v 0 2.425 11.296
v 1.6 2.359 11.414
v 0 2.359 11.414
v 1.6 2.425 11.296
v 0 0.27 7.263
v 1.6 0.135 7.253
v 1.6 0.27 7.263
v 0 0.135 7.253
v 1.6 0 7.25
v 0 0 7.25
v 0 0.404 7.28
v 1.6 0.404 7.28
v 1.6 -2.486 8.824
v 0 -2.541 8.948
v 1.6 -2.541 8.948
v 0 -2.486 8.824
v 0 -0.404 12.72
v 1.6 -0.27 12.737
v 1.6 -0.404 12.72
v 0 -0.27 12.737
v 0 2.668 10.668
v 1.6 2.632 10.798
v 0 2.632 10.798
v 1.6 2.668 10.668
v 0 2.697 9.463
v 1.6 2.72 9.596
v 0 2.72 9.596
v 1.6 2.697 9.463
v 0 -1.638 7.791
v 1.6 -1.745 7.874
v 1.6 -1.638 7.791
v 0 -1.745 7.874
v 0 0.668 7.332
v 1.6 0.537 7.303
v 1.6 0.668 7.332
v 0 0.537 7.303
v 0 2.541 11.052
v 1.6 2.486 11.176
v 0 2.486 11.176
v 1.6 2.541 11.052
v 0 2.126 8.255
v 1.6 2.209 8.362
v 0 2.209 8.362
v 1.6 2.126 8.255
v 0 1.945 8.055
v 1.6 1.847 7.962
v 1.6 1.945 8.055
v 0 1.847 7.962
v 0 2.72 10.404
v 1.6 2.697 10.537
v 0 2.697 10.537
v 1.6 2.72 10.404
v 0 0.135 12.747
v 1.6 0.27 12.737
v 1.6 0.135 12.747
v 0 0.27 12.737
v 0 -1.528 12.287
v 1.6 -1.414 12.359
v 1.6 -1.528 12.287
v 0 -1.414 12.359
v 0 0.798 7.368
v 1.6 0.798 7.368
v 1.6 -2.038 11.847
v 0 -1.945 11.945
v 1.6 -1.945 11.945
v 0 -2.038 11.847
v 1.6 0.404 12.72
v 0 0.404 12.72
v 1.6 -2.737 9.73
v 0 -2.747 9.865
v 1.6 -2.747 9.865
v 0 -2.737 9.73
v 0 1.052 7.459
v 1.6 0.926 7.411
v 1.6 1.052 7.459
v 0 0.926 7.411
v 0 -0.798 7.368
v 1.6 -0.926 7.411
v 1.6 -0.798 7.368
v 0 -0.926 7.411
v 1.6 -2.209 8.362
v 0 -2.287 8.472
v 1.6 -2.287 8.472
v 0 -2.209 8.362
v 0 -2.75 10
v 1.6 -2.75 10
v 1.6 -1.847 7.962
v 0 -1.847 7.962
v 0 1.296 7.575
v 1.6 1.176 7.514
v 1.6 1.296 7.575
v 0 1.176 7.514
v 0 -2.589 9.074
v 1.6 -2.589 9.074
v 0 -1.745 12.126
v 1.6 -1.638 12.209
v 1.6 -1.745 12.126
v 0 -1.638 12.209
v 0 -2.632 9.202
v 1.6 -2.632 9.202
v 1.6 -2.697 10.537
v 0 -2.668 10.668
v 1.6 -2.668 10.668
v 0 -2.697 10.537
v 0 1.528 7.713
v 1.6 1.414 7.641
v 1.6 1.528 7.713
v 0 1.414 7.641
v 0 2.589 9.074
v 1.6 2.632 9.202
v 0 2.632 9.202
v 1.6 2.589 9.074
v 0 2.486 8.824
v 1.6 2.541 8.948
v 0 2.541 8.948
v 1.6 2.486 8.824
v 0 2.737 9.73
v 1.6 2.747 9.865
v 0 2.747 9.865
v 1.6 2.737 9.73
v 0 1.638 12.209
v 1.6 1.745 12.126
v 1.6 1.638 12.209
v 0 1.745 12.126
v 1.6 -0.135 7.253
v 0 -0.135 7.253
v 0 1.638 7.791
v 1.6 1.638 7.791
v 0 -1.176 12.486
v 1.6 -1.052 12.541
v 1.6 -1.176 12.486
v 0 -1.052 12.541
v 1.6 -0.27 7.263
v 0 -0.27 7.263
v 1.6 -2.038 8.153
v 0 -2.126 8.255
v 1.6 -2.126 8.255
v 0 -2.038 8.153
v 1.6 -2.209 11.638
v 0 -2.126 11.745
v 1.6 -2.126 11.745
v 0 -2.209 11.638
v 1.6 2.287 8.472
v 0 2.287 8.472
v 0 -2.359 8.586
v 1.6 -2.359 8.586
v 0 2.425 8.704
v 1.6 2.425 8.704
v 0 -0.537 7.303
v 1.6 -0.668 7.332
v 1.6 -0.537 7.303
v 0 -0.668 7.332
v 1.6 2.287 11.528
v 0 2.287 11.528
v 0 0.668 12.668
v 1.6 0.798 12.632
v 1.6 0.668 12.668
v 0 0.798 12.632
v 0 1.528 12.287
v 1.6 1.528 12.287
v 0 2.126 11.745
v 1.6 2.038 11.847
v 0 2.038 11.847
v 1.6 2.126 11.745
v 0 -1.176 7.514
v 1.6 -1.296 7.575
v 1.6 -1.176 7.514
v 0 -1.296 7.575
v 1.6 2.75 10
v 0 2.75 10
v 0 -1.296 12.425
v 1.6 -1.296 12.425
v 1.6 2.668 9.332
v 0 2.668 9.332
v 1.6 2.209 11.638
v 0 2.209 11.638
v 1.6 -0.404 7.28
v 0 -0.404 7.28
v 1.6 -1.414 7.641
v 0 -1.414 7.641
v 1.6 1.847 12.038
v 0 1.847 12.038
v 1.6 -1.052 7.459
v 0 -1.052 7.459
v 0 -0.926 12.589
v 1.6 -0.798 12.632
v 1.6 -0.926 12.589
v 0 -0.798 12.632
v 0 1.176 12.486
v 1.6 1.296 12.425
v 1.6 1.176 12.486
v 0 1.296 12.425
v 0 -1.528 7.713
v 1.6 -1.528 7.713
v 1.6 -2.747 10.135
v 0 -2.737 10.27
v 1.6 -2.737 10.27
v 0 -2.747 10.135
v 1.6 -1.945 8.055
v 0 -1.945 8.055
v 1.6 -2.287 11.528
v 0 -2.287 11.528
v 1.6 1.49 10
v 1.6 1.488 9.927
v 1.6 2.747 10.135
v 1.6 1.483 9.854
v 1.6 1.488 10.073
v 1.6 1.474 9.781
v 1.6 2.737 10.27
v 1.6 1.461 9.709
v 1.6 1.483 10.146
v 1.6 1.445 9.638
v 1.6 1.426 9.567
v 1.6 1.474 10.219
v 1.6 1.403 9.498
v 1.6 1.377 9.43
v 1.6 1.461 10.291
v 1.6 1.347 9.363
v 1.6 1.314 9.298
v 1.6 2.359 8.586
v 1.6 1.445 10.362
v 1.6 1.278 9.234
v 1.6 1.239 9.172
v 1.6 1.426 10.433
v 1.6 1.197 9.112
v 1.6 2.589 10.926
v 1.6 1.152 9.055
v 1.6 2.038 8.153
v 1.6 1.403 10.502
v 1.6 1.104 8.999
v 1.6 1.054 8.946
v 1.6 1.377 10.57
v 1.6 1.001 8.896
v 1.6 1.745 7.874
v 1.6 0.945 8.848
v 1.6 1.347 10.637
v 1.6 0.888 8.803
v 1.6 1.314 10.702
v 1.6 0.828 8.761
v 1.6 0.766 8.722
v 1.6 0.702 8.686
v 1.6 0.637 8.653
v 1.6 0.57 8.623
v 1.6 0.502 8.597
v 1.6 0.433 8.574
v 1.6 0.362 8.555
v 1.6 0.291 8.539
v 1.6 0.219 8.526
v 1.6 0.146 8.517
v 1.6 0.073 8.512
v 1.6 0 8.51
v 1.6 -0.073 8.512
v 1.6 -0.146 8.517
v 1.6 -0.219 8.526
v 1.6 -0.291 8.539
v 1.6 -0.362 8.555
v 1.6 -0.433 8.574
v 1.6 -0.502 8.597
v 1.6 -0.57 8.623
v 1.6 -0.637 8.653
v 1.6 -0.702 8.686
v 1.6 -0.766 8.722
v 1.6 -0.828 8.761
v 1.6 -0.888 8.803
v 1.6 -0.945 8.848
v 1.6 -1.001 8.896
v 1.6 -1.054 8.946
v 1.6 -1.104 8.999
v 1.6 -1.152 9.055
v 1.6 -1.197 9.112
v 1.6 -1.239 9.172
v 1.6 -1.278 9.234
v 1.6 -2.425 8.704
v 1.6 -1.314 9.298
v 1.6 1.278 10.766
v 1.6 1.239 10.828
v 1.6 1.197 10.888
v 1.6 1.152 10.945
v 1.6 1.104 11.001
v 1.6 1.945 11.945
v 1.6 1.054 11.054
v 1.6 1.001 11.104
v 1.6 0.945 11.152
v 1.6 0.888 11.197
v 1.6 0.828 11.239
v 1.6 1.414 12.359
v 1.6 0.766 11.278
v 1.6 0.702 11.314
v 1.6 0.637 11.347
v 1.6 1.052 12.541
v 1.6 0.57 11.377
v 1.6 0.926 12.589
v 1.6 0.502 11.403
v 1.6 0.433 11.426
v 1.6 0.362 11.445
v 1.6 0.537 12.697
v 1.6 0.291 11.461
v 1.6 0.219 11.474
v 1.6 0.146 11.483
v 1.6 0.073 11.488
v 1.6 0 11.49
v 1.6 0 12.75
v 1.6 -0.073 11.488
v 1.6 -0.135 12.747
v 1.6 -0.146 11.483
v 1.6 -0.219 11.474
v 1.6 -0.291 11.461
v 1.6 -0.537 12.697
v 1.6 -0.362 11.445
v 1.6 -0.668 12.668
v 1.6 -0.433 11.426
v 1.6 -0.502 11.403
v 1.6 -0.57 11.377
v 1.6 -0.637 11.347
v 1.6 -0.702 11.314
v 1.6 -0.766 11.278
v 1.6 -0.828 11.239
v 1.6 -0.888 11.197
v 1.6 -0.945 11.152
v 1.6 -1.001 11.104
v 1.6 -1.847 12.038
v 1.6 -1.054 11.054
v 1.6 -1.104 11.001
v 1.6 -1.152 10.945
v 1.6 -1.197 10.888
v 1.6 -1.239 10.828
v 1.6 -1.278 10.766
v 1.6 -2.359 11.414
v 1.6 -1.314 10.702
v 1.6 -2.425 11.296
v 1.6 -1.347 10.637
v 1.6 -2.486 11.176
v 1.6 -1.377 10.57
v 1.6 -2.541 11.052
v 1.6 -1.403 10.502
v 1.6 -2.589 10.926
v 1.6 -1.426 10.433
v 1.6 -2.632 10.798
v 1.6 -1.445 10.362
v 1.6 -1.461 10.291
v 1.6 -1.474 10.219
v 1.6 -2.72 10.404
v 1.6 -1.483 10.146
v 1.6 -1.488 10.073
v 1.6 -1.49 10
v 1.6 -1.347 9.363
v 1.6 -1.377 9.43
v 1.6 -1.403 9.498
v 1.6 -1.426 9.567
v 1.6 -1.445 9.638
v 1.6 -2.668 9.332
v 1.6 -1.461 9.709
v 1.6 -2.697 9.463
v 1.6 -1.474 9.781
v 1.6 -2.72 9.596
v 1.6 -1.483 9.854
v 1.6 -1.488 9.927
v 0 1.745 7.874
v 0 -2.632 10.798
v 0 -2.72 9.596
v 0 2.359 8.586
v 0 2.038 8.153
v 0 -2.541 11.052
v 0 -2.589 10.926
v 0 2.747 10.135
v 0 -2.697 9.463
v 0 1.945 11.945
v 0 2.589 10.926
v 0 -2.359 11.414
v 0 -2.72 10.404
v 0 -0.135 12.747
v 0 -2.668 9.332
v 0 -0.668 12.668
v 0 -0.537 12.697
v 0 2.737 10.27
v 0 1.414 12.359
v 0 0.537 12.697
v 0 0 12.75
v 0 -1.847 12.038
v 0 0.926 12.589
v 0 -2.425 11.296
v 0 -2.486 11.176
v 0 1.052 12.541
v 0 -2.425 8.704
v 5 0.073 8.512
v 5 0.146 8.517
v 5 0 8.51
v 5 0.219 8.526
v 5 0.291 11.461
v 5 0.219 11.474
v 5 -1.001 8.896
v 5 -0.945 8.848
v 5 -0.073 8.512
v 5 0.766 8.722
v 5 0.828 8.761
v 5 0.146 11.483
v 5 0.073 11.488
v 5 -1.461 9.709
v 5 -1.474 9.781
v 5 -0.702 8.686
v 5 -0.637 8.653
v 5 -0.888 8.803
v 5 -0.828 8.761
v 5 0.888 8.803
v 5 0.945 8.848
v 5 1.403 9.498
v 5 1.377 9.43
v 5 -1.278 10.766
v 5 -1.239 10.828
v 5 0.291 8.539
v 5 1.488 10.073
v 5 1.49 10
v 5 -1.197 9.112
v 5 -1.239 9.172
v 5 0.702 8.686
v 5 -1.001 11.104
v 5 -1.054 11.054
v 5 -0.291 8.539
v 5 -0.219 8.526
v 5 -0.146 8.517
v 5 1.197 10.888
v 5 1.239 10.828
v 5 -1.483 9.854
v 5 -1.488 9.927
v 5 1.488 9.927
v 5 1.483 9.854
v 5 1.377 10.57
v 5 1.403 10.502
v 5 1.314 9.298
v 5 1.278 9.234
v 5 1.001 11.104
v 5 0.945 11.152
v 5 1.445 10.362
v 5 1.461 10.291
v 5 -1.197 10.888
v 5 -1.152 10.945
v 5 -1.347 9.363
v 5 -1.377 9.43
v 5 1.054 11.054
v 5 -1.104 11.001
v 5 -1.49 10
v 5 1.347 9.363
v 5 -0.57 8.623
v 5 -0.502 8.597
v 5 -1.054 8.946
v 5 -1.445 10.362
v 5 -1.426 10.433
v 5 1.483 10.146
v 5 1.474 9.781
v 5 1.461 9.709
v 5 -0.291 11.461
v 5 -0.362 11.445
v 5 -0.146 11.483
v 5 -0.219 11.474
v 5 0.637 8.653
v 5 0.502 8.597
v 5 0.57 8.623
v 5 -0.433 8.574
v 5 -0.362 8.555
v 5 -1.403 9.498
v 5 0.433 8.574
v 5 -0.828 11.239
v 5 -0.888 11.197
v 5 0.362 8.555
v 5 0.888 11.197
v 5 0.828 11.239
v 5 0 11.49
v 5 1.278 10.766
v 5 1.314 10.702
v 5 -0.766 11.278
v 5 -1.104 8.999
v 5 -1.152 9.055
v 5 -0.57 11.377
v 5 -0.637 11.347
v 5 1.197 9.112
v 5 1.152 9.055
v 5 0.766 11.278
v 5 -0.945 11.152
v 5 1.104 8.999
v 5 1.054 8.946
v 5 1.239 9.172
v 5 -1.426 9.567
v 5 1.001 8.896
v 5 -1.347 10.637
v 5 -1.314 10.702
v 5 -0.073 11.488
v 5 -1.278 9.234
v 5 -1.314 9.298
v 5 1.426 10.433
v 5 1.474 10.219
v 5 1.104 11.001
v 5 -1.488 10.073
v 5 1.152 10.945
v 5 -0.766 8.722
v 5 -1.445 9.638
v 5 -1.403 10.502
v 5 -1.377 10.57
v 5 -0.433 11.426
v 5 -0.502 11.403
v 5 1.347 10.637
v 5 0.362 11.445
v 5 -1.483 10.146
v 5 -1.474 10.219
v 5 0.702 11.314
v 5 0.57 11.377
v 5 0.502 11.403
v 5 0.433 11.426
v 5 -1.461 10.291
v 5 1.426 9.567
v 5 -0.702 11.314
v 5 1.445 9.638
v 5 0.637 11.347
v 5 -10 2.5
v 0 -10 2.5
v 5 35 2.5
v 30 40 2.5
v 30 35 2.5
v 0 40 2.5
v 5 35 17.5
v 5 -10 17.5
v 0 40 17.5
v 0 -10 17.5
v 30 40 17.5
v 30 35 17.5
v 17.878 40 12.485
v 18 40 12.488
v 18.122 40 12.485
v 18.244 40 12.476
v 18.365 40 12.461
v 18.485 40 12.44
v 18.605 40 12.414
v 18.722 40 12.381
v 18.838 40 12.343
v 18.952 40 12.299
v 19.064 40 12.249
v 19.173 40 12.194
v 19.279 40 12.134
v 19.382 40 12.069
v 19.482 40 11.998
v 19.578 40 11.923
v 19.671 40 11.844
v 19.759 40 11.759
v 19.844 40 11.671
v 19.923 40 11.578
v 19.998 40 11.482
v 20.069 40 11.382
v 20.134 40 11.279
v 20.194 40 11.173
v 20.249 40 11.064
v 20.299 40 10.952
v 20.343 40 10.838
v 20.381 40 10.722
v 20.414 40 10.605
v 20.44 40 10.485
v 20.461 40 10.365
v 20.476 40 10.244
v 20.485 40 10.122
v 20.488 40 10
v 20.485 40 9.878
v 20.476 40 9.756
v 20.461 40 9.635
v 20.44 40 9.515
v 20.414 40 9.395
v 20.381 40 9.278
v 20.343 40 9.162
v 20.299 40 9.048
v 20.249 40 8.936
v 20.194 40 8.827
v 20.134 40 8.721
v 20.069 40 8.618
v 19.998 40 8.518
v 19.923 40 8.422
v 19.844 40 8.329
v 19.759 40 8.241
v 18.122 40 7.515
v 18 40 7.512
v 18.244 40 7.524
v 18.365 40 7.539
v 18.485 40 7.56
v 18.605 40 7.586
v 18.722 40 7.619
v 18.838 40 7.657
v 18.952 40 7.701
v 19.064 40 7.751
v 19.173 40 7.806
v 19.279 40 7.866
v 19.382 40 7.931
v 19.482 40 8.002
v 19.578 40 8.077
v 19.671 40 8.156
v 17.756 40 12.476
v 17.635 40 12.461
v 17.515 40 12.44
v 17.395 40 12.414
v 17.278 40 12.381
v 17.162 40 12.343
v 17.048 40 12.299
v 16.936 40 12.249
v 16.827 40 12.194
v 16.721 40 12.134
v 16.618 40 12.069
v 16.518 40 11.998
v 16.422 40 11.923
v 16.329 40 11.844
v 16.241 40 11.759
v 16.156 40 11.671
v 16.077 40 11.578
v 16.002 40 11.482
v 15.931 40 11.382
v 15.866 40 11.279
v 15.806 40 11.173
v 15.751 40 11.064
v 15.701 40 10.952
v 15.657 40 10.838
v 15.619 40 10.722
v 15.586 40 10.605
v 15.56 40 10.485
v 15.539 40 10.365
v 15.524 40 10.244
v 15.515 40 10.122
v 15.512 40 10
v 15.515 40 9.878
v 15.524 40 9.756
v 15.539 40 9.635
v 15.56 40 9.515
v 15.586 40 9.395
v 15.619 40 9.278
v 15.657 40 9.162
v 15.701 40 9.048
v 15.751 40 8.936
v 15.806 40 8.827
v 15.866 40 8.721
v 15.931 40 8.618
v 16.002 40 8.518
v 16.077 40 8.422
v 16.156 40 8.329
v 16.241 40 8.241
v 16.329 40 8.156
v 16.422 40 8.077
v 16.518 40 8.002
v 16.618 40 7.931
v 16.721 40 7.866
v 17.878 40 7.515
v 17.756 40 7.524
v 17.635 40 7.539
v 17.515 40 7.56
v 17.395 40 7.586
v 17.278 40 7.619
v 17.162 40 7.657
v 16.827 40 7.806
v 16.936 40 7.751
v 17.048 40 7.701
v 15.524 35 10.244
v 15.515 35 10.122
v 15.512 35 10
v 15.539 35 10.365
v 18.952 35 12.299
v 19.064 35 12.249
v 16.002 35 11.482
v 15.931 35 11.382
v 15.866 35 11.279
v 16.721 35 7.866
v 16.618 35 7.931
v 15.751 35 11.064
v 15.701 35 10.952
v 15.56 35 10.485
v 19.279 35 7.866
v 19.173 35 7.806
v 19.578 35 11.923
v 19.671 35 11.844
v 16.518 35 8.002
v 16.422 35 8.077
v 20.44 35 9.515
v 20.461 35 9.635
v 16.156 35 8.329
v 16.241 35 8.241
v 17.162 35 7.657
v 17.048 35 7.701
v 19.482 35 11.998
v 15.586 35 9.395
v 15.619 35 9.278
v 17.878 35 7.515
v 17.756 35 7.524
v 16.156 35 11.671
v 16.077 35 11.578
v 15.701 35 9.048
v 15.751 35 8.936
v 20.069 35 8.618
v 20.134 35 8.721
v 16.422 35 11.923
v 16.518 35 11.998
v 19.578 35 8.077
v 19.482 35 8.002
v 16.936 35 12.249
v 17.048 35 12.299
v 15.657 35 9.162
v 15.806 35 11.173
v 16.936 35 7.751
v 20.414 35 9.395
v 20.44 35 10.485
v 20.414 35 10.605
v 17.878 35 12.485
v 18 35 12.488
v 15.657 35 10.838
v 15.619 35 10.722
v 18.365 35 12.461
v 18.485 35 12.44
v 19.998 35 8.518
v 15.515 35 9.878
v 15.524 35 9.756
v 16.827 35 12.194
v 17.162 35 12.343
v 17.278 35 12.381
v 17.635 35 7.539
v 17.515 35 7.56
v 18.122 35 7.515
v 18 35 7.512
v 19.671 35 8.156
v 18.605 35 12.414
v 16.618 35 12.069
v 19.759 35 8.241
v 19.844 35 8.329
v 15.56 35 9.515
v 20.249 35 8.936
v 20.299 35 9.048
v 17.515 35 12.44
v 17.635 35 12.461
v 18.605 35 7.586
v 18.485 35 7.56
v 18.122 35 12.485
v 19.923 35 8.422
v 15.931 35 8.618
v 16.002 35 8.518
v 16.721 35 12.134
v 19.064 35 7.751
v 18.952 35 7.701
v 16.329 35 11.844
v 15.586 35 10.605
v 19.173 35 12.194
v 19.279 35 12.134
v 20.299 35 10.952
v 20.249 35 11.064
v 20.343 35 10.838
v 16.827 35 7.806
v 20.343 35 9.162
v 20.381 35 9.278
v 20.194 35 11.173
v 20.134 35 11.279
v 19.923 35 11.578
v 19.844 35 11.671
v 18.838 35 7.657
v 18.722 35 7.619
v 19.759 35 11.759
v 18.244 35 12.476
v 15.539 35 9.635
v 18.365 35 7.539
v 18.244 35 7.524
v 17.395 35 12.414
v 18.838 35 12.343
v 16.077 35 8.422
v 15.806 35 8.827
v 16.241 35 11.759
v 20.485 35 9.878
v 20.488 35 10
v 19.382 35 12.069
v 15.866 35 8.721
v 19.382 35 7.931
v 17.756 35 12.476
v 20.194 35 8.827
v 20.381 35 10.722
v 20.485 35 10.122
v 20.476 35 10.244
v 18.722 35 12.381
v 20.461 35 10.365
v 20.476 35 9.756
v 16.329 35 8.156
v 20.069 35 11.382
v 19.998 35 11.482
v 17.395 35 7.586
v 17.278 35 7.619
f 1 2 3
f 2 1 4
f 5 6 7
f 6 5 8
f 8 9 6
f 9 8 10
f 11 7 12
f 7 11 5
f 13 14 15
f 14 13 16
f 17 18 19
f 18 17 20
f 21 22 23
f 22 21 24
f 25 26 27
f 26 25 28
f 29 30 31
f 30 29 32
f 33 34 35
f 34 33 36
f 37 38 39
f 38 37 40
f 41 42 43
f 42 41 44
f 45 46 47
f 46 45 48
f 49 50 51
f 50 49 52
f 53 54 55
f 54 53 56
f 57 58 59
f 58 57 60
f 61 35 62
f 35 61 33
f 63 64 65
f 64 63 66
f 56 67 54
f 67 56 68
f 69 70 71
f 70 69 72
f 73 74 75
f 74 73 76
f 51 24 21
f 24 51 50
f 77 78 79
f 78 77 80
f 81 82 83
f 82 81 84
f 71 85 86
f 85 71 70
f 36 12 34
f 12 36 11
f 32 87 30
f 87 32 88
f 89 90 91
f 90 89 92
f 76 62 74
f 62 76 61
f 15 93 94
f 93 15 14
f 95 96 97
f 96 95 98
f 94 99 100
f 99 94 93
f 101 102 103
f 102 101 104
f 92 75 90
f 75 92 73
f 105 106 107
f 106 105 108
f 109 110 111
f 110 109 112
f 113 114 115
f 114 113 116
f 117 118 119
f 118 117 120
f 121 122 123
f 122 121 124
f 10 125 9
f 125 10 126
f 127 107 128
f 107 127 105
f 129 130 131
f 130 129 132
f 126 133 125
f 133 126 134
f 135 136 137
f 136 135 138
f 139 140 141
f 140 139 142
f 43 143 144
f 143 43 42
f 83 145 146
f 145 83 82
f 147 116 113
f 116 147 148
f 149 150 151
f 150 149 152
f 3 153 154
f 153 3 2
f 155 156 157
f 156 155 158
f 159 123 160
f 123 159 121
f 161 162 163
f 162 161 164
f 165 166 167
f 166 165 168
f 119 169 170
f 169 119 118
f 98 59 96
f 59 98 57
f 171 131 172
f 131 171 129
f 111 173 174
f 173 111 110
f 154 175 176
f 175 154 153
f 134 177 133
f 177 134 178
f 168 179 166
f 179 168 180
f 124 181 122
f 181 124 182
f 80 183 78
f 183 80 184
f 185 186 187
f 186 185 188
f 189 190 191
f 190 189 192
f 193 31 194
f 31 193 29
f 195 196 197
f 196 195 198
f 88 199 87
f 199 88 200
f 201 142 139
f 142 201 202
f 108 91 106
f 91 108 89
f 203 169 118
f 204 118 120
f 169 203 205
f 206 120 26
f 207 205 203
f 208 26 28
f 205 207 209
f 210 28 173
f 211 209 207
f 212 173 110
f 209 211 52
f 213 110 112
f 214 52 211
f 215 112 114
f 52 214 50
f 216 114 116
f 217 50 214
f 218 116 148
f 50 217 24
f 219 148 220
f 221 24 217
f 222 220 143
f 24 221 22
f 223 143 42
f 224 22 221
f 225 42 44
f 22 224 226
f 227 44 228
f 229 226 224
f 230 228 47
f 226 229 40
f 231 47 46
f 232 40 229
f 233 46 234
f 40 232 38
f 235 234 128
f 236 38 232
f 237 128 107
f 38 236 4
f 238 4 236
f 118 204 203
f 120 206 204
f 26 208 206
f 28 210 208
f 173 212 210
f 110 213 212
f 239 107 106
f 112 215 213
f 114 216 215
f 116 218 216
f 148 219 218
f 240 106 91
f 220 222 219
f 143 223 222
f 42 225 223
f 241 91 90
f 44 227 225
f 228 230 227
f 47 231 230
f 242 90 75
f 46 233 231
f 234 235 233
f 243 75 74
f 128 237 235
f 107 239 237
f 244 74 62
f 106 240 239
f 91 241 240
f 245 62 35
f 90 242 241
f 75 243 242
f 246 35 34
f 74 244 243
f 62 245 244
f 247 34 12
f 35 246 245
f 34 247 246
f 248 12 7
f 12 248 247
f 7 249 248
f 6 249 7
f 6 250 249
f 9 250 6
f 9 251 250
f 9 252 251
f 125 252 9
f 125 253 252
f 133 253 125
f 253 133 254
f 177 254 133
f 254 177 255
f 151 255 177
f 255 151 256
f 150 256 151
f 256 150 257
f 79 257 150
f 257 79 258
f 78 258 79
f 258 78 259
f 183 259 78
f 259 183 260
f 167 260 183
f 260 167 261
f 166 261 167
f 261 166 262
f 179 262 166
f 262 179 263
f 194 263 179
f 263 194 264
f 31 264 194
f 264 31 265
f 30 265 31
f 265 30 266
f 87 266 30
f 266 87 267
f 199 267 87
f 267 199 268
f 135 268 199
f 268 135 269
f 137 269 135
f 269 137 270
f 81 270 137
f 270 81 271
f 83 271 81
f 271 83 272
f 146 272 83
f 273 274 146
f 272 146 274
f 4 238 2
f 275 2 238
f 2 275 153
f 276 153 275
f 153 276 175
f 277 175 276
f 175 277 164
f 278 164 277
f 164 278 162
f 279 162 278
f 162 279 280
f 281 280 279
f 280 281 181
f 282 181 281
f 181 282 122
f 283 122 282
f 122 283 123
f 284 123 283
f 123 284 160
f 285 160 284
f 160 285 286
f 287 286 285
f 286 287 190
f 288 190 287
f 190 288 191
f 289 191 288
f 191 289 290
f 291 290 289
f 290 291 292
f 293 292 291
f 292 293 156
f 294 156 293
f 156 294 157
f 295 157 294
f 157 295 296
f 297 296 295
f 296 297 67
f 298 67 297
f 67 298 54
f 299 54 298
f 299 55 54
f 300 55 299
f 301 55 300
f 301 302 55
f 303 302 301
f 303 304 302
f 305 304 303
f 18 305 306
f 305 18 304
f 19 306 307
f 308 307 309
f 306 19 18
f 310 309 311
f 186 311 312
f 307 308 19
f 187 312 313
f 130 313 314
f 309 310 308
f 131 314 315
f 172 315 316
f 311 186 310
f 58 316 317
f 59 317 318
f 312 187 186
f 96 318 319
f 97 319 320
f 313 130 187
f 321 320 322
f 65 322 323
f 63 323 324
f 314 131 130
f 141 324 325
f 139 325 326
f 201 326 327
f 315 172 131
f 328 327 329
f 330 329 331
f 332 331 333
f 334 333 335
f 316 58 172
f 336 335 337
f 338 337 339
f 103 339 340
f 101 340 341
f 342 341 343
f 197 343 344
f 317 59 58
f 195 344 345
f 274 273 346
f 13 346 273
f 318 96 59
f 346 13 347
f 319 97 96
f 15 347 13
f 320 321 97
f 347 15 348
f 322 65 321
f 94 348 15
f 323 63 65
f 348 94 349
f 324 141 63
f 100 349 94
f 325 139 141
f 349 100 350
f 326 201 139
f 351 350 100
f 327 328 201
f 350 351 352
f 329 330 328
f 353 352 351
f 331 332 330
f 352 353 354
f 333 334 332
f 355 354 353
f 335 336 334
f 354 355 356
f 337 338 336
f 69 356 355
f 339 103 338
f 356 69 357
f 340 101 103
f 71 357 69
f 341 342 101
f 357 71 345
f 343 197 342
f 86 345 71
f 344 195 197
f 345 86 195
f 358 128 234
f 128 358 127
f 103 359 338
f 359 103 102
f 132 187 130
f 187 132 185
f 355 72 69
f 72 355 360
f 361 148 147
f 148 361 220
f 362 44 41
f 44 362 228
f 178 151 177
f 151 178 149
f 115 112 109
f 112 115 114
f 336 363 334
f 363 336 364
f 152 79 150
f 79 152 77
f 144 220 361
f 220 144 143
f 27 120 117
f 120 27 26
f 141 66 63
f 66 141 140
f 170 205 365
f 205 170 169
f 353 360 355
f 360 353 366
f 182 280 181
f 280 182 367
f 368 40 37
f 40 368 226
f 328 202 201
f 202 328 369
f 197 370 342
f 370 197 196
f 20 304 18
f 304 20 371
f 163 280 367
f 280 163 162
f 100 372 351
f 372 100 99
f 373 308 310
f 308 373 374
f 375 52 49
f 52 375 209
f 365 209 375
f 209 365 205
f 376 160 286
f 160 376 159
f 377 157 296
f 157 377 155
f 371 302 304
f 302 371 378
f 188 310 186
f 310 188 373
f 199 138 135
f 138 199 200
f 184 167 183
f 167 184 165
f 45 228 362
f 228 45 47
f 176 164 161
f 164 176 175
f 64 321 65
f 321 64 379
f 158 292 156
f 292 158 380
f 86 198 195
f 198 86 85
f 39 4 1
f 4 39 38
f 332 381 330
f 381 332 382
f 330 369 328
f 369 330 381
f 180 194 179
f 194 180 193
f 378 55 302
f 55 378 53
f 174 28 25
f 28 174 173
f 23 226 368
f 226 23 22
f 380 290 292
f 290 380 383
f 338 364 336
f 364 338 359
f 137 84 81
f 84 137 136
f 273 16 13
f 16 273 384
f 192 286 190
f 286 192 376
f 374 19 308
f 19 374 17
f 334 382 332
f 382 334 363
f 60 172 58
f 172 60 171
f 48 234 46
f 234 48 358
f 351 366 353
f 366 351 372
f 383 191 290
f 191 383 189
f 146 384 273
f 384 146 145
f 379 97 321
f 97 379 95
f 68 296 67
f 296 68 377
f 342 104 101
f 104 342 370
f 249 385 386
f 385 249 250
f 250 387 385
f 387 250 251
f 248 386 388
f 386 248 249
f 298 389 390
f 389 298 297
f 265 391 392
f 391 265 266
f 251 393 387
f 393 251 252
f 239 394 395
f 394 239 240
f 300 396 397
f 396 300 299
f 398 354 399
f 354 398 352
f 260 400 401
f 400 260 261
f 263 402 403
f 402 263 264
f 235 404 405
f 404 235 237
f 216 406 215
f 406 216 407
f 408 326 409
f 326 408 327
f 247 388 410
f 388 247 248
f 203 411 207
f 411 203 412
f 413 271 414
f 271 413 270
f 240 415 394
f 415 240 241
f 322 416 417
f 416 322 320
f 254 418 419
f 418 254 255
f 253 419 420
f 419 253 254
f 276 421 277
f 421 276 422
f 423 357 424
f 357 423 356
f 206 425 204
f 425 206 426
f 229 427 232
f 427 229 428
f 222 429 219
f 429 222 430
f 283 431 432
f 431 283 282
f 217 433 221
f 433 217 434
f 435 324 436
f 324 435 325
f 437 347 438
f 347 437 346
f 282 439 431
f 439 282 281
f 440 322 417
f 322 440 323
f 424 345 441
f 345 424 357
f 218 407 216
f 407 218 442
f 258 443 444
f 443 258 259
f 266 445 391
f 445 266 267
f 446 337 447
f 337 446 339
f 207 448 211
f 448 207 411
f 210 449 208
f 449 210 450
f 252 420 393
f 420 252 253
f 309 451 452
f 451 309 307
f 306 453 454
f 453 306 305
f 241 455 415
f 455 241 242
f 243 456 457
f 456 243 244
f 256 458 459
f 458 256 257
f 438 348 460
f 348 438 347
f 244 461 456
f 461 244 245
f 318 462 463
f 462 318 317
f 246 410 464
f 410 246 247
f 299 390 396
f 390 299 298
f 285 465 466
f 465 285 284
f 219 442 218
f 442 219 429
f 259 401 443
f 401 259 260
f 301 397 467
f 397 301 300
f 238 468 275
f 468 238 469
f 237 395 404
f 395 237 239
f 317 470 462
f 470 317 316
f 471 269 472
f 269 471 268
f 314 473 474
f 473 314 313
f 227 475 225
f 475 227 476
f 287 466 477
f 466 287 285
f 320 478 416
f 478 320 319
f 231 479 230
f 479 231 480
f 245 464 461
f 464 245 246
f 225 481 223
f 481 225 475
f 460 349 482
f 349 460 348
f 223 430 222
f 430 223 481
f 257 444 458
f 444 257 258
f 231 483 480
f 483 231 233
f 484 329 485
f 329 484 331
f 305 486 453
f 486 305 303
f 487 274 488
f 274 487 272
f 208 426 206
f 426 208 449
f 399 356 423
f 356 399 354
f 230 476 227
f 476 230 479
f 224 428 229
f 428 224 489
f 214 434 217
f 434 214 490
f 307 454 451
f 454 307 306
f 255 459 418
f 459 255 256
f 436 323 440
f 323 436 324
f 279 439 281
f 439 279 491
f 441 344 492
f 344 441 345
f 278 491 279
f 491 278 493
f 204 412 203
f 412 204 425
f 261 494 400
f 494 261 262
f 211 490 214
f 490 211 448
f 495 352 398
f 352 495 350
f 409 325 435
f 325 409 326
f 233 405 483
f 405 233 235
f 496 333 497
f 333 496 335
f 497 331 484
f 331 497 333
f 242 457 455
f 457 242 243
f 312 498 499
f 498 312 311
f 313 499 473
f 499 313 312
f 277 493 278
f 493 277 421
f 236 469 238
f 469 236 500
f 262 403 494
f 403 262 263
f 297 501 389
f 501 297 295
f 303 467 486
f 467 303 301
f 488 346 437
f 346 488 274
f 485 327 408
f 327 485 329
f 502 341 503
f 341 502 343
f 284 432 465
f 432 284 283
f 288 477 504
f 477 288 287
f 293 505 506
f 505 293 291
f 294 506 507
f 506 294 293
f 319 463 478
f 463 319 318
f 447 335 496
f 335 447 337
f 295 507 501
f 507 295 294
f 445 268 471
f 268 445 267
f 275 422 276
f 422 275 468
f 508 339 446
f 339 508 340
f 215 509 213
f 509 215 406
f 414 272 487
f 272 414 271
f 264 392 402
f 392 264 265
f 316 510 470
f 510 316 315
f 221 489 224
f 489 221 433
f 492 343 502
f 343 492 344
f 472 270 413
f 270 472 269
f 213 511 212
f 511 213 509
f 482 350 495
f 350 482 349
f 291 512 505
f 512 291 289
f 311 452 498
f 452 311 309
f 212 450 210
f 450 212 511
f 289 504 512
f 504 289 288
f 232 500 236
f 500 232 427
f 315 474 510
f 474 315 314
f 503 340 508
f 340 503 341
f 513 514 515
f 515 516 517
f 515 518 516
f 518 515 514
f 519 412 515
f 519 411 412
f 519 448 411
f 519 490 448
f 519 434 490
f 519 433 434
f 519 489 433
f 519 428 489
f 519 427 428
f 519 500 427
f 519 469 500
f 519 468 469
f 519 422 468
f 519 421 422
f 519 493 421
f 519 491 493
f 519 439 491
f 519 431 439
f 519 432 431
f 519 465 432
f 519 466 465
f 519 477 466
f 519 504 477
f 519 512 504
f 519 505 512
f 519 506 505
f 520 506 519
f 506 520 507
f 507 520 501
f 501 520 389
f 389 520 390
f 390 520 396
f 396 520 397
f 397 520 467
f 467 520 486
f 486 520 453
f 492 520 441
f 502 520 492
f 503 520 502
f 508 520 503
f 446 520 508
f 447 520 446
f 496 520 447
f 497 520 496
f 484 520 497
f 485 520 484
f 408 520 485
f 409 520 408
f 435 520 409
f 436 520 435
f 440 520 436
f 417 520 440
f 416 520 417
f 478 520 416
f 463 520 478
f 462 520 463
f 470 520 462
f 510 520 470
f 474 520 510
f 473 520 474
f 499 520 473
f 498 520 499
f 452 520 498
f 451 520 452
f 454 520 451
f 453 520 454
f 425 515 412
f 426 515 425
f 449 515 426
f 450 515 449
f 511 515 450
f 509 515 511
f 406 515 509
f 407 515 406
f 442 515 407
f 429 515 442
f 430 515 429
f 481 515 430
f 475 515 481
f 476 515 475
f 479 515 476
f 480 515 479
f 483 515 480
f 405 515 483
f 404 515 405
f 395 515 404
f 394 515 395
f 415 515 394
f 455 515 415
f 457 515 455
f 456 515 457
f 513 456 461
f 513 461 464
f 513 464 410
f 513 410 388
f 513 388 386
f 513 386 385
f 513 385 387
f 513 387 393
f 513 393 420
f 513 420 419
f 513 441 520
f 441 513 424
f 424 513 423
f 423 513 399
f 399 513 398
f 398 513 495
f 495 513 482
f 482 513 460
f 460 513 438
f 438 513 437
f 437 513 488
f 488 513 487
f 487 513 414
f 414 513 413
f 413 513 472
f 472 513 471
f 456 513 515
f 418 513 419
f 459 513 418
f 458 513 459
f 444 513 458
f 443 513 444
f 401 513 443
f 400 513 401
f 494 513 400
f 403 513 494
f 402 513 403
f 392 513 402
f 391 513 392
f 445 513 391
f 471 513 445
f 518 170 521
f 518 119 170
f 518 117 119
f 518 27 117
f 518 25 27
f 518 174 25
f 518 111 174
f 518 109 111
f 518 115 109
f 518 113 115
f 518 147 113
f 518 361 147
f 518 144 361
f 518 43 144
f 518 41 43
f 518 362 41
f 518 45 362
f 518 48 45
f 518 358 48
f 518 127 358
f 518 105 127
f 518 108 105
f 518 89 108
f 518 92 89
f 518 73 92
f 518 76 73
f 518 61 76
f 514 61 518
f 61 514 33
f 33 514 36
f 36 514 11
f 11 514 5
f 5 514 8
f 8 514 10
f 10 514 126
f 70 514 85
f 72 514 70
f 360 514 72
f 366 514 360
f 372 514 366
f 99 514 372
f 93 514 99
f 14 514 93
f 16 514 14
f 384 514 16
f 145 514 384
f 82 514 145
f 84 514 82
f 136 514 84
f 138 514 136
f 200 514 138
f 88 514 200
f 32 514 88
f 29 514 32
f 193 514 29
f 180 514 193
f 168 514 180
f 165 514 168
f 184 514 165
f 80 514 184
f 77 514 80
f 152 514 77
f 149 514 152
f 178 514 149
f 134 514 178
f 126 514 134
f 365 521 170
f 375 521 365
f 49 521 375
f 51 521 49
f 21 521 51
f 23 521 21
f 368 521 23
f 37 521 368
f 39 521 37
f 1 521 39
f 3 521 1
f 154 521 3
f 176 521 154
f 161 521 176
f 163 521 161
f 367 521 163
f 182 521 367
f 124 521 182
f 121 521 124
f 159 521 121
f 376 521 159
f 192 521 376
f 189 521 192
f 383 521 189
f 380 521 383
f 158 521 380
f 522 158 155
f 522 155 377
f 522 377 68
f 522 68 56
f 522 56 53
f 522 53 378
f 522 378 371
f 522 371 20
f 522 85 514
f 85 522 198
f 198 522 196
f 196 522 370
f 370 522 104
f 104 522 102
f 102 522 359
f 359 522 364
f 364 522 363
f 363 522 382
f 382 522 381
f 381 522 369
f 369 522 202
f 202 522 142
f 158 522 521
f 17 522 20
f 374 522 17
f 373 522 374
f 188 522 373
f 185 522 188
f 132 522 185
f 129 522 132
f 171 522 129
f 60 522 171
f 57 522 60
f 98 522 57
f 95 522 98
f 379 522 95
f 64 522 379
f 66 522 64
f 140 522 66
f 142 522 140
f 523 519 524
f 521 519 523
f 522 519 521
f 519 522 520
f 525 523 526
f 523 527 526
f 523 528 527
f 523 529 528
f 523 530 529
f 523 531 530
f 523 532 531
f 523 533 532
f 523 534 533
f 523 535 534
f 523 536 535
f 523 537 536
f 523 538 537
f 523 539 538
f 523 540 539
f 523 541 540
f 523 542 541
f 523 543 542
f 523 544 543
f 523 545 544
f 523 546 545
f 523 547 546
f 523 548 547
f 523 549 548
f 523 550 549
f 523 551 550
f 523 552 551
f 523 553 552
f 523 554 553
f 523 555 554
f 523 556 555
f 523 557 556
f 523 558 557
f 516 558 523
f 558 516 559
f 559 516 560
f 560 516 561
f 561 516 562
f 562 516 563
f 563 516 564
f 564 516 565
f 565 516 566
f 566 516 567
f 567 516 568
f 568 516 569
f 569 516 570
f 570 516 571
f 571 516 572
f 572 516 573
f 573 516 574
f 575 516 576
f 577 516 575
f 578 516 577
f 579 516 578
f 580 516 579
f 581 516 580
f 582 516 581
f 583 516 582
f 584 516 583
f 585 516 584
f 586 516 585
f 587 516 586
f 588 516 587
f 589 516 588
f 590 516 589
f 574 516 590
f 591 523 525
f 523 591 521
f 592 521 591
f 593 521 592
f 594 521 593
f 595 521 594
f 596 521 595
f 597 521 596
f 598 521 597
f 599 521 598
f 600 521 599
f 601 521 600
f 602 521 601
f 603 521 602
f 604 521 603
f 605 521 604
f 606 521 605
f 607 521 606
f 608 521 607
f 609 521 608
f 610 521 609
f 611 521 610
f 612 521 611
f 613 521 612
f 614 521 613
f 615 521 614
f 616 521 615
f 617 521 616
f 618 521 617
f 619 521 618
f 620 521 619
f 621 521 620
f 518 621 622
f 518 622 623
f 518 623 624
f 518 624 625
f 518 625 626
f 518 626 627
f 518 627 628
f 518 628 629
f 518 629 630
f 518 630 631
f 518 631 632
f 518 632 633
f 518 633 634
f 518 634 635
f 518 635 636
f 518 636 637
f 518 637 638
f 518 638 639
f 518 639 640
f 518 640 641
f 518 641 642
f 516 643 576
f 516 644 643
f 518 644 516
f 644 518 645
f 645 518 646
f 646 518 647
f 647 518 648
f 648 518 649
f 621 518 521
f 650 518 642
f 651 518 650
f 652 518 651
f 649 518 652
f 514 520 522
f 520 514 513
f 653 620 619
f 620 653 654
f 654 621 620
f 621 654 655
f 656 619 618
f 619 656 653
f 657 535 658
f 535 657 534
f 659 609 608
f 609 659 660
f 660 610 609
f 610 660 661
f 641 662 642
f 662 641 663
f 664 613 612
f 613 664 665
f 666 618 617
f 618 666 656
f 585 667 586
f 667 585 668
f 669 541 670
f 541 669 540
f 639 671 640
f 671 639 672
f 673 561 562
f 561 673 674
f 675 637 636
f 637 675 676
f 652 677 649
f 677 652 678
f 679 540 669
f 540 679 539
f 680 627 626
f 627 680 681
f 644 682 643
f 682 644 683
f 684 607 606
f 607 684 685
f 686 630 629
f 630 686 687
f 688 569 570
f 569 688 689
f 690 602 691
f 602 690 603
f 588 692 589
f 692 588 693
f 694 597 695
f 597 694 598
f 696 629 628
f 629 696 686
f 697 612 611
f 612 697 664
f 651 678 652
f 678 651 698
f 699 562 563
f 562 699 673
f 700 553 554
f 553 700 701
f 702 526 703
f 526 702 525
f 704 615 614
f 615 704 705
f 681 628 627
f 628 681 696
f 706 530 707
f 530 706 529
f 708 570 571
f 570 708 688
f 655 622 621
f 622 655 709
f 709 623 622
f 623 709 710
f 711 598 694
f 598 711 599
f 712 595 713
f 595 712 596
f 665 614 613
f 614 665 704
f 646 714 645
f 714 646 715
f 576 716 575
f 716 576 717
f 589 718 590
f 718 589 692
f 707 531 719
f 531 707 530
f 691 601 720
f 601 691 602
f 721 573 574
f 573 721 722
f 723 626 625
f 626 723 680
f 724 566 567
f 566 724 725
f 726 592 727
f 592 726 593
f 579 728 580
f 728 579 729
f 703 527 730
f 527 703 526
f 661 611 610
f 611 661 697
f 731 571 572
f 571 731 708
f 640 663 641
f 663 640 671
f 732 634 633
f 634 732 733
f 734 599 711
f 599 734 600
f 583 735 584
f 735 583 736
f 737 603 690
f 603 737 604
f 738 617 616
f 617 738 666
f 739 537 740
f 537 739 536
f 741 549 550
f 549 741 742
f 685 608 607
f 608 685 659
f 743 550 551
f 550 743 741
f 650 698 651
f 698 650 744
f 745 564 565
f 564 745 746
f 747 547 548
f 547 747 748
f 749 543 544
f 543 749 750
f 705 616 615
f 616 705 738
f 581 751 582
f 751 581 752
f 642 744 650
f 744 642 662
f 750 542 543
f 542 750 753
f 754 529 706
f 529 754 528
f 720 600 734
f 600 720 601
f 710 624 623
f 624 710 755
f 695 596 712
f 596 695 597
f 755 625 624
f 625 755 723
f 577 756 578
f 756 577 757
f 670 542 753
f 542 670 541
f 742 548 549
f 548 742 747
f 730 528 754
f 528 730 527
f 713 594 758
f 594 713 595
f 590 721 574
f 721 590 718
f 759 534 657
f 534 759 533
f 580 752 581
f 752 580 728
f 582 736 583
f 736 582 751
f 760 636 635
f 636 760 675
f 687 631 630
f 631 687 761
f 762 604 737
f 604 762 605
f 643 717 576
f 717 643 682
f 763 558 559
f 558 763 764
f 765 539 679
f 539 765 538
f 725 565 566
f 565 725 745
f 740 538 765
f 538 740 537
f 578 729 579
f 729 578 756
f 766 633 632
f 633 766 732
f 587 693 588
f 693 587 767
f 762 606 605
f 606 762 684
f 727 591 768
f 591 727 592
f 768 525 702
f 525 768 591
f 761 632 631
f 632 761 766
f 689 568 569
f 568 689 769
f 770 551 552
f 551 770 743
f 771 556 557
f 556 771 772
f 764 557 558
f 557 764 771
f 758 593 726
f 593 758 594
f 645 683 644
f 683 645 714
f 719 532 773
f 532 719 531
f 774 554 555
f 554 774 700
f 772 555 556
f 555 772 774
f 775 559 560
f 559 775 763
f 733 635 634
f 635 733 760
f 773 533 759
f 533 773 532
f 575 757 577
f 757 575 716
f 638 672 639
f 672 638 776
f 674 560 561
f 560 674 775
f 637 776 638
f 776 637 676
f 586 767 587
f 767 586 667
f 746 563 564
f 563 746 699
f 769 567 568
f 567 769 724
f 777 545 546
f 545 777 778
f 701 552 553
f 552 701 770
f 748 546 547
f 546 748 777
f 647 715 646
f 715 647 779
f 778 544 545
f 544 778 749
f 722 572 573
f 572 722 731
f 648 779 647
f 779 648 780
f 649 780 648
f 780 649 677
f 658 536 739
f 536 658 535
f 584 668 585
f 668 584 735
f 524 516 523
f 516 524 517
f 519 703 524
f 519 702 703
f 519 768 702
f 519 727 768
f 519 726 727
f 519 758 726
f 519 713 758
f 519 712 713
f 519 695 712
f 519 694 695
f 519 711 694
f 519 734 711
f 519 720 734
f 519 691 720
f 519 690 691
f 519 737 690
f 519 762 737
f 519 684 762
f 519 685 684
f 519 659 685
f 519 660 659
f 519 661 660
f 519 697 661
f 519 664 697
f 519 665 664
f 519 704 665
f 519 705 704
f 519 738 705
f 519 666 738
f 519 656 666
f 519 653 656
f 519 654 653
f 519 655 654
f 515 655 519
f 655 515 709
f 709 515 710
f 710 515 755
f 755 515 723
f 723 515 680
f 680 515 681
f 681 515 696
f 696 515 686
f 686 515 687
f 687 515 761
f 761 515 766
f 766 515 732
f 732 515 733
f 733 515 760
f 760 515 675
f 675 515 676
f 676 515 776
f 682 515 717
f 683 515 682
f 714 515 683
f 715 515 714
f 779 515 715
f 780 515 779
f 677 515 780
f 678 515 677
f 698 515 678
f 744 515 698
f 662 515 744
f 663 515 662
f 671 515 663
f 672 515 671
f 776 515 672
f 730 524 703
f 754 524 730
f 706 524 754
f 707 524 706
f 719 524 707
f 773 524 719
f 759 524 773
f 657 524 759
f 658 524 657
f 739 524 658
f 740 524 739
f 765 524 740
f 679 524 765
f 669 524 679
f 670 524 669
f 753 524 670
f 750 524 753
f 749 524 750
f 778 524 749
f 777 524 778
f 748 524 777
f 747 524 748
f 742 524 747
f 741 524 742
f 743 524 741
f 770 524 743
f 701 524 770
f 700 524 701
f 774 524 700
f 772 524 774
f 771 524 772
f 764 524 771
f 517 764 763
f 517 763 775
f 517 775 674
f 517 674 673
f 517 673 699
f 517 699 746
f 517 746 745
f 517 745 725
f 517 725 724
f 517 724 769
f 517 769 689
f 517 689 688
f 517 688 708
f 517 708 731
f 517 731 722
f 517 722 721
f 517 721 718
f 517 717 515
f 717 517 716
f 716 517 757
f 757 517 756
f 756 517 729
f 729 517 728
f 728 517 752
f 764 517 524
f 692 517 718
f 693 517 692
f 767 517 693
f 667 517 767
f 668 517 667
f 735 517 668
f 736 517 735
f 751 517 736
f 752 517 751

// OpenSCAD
use <MCAD/nuts_and_bolts.scad>;

$fn=128;

module endstop()
{
  difference(){
    translate([-7.5,-10,0]) cube([15,50,5]);
    translate([0,0,1.6]) boltHole(3.2,length=6);
    }
  
  difference(){
    translate([-7.5,40,30]) rotate([90,90,0]) cube([25,15,5]); 
    translate([0,34,18]) rotate([90,90,180]) boltHole(5.2,length=7);
  } 
}


translate([0,0,10]) rotate([0,90,0]) endstop();
